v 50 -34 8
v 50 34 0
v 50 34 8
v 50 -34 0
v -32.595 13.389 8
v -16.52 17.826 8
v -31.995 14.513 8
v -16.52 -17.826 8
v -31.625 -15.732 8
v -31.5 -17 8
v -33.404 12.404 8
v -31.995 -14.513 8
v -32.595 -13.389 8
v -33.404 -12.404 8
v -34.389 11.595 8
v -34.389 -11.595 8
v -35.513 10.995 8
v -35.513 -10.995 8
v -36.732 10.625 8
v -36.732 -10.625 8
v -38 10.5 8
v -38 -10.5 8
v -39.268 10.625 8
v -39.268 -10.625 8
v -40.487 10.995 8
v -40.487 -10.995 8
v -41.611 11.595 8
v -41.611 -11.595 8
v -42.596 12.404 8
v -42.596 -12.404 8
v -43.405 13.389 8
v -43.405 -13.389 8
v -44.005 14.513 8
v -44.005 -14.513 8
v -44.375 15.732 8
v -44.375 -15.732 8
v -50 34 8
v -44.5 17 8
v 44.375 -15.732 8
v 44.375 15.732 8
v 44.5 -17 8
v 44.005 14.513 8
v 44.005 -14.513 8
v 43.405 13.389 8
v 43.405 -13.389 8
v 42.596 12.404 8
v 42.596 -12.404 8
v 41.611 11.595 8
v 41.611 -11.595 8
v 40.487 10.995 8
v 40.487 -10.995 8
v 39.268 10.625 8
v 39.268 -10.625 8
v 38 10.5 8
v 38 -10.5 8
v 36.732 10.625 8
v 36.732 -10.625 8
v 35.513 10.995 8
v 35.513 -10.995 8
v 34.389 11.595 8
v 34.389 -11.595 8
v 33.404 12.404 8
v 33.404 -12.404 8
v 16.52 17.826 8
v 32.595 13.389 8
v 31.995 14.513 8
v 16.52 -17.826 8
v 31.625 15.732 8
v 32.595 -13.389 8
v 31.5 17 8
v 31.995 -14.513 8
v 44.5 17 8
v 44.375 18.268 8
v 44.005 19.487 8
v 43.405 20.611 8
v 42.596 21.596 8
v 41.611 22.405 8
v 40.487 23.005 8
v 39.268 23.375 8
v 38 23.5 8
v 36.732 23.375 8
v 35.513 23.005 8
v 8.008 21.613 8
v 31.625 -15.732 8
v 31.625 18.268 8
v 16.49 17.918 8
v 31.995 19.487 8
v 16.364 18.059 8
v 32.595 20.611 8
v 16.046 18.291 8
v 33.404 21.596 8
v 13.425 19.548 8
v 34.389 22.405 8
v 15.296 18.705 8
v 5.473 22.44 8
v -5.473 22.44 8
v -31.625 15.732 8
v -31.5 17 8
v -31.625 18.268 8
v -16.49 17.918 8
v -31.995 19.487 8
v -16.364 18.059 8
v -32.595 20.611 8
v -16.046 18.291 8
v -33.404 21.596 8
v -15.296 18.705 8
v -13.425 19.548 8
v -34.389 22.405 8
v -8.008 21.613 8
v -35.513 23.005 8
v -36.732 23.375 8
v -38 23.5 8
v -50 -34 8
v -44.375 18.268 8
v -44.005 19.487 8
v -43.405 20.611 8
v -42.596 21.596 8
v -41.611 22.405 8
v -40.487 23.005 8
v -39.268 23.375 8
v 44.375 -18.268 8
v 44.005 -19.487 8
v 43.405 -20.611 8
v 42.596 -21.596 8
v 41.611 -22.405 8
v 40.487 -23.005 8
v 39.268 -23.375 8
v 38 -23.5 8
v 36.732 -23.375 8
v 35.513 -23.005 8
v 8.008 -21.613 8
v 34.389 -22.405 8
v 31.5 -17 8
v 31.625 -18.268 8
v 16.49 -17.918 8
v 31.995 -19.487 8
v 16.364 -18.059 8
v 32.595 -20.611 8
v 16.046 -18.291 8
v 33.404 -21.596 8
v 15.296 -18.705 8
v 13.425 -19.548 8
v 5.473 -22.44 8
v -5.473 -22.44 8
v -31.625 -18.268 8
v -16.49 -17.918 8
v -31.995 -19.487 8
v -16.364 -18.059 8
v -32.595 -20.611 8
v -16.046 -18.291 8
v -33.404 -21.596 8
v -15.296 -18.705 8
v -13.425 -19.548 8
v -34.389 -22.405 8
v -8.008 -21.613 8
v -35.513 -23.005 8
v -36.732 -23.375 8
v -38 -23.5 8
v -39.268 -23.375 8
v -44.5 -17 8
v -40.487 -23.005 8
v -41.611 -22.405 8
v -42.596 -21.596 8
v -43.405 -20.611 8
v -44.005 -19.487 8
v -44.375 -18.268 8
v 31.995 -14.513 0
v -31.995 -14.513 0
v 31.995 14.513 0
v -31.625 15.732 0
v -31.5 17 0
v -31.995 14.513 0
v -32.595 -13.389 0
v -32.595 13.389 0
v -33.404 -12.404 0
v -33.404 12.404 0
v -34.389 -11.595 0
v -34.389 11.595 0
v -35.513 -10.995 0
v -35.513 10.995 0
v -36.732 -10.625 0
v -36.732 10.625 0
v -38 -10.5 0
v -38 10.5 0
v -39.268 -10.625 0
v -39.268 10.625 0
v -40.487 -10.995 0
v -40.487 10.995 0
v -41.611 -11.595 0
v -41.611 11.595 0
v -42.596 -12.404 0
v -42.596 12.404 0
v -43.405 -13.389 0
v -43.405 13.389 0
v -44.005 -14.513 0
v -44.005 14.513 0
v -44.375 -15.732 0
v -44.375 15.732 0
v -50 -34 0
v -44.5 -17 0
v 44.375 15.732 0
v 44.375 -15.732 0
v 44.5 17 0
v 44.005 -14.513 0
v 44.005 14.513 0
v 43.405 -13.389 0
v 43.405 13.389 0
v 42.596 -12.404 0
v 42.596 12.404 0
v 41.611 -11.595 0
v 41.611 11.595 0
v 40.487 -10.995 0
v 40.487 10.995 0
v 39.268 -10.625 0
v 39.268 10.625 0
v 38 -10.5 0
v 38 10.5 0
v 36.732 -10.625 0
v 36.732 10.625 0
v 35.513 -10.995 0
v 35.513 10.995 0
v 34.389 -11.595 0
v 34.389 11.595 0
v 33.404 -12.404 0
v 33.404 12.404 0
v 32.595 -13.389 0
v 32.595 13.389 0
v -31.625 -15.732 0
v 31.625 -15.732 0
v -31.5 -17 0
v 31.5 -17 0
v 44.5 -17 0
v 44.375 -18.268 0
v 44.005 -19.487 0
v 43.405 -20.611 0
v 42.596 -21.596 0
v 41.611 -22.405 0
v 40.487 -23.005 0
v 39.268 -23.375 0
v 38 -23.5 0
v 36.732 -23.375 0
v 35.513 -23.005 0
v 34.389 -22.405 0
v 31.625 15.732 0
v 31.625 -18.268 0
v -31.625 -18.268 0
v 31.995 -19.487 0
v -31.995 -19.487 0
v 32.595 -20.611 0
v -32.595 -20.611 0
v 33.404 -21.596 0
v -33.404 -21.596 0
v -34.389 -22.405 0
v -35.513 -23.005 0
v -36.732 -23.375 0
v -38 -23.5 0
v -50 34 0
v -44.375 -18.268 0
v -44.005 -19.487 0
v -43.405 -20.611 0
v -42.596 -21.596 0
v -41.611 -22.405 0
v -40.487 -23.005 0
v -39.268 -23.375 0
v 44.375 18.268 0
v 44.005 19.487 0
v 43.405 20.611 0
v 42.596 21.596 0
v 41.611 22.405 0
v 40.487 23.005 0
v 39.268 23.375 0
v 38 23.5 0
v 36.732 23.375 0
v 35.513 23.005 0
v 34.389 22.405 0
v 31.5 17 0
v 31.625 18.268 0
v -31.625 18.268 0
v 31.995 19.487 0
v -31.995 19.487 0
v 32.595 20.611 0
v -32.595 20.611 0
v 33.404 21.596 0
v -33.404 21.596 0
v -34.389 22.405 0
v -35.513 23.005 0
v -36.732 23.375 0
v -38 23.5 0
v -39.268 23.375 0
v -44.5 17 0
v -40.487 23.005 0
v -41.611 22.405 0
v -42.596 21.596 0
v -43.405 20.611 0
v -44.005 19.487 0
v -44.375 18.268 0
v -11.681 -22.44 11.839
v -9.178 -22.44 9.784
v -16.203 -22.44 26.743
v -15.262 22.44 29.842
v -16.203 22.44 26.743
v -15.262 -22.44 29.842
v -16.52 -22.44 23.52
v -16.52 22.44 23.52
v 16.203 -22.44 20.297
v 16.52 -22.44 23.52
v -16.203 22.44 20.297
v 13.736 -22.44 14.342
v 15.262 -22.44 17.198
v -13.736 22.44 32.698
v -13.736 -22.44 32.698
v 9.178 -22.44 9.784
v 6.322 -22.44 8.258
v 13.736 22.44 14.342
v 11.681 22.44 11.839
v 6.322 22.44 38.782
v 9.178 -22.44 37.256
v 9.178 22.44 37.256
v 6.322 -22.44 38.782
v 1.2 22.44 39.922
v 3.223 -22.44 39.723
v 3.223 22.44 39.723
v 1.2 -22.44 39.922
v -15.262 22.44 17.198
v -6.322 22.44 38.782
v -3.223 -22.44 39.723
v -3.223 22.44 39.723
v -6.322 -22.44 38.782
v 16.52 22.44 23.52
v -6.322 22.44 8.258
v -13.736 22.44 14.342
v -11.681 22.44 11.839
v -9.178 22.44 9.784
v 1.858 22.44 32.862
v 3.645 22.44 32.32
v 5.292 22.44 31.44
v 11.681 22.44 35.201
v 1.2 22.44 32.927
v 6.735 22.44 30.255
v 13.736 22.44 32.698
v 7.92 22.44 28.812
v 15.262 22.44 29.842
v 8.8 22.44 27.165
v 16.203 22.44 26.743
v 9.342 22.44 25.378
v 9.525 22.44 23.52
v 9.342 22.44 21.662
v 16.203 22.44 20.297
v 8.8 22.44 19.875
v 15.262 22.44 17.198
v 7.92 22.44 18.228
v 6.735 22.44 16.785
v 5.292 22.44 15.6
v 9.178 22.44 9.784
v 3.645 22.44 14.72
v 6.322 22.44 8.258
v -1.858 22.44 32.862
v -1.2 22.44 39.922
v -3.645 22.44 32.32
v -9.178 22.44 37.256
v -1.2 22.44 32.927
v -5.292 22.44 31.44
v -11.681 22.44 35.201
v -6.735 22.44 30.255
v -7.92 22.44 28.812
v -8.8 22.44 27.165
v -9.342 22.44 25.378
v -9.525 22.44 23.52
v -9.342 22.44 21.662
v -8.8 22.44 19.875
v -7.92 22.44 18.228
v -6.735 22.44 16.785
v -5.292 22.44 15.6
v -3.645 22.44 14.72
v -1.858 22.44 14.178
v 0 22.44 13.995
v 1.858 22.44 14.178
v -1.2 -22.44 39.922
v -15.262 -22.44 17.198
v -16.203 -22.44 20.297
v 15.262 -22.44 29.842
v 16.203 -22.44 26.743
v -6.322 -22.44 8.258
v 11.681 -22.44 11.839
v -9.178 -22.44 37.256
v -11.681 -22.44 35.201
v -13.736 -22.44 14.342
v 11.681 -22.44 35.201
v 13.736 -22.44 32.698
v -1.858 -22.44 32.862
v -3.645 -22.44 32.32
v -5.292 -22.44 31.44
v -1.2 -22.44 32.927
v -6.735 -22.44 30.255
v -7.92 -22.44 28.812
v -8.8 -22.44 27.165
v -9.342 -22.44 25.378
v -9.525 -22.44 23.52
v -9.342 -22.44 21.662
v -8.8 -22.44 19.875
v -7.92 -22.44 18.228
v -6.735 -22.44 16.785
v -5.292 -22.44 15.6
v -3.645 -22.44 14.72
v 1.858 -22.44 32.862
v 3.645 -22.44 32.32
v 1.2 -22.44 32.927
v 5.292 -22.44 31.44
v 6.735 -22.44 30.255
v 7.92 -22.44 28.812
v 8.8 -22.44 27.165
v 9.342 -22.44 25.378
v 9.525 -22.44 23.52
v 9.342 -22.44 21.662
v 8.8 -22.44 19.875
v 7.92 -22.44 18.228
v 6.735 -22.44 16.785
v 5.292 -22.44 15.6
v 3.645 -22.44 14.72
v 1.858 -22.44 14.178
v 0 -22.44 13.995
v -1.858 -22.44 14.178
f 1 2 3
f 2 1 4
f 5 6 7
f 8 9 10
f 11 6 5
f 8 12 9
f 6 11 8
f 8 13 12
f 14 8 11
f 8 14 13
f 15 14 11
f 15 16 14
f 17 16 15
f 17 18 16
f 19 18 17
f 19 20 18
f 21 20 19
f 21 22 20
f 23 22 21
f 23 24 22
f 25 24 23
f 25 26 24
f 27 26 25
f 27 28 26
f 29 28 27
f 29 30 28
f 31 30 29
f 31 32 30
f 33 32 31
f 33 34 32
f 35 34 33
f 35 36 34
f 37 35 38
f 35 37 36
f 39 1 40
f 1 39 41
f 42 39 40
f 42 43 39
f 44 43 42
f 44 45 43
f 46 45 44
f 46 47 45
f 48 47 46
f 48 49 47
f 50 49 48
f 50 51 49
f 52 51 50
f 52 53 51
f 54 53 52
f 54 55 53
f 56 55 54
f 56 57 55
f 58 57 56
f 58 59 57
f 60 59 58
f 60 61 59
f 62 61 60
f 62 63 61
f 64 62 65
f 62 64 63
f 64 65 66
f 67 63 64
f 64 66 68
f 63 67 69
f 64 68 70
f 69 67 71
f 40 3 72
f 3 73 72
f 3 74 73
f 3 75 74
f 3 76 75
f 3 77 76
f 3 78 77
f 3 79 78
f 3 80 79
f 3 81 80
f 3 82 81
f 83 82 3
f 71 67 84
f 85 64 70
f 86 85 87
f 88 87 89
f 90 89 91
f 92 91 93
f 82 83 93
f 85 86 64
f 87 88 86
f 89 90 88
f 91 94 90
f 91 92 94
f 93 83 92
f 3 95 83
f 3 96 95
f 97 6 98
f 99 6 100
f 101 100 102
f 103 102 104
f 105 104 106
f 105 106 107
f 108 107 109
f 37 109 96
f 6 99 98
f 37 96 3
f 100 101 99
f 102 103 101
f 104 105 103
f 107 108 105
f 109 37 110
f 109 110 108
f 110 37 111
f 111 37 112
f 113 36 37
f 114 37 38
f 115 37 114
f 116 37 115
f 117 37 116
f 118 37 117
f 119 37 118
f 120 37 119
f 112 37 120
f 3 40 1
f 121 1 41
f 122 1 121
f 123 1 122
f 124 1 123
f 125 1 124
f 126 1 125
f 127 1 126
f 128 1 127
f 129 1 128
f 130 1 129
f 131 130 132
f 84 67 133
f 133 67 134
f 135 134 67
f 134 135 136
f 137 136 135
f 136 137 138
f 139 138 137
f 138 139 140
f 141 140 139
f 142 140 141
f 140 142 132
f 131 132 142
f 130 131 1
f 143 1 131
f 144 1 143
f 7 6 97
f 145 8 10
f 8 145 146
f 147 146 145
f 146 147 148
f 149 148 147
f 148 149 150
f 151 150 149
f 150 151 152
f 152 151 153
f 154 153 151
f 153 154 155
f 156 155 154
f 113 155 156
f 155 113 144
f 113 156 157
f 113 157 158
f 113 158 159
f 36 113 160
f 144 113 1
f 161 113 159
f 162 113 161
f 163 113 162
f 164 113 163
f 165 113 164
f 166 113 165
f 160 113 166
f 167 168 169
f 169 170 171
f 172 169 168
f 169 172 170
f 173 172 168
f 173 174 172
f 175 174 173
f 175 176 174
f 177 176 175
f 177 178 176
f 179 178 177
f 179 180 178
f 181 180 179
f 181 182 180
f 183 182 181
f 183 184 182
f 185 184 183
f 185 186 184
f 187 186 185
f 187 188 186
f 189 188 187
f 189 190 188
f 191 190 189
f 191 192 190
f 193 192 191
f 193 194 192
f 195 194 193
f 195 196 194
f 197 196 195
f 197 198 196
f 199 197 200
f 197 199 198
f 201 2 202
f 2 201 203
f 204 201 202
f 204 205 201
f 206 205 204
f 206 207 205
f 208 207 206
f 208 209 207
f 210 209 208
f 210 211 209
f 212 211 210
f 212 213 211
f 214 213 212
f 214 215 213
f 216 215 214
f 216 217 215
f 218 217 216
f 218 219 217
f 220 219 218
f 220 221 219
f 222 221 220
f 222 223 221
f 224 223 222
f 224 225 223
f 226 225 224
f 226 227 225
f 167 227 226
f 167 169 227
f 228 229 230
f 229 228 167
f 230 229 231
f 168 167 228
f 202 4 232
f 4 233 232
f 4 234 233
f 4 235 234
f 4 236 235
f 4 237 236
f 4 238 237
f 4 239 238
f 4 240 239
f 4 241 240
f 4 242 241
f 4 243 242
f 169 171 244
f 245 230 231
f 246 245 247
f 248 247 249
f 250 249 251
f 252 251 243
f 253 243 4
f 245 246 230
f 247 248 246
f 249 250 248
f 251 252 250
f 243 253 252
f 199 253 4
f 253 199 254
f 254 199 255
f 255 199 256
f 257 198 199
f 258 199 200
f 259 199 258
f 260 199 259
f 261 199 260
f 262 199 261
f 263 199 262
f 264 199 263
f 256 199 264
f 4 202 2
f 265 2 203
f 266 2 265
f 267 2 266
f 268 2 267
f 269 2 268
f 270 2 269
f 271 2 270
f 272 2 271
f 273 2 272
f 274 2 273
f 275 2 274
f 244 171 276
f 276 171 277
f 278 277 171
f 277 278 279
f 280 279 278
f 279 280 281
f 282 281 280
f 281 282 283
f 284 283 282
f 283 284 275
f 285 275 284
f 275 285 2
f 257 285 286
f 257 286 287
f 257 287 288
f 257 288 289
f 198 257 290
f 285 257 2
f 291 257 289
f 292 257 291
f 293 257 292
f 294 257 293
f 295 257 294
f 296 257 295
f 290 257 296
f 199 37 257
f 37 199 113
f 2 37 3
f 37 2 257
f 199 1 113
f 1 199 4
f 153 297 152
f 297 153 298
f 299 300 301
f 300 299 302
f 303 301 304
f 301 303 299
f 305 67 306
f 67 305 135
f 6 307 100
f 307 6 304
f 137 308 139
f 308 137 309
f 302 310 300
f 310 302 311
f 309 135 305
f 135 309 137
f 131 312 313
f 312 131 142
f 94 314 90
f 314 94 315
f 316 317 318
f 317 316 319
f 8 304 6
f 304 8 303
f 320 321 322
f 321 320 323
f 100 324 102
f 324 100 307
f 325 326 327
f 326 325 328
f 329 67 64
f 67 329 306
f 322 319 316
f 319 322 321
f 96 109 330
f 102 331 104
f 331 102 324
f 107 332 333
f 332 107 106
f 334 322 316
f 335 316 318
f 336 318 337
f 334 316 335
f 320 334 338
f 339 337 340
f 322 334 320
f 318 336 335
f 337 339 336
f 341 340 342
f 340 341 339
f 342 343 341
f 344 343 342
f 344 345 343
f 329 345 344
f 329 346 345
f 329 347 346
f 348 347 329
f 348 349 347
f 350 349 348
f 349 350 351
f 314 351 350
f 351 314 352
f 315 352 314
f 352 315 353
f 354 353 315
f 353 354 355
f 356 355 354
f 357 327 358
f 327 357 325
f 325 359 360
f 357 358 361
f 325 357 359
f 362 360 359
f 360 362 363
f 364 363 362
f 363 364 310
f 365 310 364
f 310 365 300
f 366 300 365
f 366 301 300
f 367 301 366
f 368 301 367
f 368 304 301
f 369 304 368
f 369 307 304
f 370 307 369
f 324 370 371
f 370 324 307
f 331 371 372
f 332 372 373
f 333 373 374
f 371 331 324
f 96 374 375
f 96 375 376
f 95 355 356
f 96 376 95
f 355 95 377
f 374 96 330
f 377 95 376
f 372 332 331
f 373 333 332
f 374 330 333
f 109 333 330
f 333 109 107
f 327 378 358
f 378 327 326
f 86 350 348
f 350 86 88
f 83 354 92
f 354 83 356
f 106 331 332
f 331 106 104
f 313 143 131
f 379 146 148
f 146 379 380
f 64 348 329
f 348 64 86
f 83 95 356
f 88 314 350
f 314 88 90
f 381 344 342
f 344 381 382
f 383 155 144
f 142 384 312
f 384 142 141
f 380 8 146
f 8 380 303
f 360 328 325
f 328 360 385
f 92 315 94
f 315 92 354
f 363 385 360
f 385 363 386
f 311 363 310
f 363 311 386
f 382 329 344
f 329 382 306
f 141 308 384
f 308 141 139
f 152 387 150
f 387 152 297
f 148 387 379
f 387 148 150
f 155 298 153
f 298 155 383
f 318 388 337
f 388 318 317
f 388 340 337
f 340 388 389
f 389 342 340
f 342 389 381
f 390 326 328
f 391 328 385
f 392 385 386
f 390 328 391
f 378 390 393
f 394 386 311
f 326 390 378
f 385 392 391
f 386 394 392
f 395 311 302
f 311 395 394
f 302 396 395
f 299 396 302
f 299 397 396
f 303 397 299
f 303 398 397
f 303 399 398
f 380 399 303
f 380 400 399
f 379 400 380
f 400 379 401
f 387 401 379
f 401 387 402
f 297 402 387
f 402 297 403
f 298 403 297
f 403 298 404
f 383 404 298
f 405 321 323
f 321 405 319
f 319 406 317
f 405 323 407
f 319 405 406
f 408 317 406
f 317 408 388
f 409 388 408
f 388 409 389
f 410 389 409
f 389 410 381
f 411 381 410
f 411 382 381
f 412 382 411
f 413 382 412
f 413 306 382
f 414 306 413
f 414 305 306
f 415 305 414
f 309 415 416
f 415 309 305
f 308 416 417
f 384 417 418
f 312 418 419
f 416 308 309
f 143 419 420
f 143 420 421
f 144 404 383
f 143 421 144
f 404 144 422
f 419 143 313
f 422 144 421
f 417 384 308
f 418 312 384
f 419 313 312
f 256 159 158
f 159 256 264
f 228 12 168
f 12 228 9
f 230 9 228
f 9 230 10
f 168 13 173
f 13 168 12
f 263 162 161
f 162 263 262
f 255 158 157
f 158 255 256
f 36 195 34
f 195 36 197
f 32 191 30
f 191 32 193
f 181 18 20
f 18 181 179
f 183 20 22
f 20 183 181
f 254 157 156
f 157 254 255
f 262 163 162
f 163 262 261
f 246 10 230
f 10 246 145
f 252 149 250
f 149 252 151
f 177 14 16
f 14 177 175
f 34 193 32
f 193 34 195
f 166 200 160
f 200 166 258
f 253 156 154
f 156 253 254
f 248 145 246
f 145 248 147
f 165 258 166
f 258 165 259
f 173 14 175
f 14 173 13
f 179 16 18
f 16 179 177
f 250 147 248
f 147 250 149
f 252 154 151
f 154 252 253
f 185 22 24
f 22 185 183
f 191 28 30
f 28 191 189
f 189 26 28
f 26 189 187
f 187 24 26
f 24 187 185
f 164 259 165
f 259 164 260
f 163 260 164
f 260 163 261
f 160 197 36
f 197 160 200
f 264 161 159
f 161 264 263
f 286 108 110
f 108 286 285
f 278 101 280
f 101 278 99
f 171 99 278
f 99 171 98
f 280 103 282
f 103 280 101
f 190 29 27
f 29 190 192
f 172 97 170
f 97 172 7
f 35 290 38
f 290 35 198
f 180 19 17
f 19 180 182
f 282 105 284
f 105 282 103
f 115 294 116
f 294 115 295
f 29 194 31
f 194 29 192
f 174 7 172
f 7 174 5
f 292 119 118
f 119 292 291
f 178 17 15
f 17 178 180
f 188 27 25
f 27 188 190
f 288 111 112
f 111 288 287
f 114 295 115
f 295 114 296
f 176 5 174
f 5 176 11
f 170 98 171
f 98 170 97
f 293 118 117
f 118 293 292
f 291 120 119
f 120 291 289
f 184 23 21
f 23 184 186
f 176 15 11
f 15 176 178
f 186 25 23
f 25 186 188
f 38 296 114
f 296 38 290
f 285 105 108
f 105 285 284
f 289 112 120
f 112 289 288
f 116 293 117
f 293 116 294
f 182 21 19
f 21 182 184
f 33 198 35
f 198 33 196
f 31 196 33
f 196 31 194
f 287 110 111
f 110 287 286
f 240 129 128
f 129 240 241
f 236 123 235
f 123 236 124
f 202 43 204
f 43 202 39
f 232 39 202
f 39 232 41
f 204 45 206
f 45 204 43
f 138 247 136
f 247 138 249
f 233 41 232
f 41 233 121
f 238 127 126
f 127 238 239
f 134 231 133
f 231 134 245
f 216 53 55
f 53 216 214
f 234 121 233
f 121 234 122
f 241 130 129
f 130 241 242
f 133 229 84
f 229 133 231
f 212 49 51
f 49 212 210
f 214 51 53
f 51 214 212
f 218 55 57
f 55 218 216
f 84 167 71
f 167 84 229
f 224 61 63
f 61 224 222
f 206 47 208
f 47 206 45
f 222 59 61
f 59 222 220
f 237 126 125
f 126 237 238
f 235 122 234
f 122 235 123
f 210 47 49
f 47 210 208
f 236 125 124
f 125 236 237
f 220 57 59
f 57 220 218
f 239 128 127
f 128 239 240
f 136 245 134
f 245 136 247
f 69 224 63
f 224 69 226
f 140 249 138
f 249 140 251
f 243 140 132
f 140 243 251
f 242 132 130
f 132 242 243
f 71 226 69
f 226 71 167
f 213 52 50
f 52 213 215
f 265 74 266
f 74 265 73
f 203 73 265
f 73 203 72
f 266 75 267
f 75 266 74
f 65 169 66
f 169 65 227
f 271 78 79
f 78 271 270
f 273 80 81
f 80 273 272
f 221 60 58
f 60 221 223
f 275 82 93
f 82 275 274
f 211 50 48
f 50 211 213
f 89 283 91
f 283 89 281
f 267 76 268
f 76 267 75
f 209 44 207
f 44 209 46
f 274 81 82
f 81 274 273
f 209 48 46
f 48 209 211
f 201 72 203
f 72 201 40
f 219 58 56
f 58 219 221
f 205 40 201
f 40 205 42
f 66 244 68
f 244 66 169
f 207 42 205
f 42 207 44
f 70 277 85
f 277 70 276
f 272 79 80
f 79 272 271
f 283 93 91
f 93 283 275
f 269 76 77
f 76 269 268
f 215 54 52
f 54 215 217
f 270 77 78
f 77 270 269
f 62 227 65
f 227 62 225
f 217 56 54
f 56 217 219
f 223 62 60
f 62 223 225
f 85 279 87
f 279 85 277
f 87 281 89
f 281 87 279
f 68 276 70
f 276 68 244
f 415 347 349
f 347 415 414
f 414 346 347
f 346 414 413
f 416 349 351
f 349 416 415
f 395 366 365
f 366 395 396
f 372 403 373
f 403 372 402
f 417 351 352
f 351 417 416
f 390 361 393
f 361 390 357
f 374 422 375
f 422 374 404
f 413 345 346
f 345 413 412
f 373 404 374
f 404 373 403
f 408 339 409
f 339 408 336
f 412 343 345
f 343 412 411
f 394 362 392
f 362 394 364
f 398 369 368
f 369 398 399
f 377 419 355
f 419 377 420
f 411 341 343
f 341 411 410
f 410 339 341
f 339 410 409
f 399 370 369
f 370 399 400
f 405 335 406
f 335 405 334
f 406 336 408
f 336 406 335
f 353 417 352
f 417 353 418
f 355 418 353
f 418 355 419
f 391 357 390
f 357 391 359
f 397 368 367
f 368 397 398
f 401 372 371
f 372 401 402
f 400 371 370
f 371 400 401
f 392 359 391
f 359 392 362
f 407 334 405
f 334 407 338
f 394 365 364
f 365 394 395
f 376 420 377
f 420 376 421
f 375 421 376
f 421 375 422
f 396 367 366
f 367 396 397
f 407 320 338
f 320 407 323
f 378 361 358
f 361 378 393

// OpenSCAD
$fn = 32;

// ----------------------------------------------------------------------
// Bearing block: 100 x 68 mm base, 19.05 mm bore at 23.52 mm
// ----------------------------------------------------------------------

// --- parameters (mm) ---
base_w = 100;             // base width
base_d = 68;              // base depth
base_t = 8;               // base thickness
bore_d = 19.05;           // shaft / bearing bore
house_r = 16.52;          // housing outer radius
house_len = 44.88;        // housing length along the shaft
foot_w = 33.04;           // foot width under the housing
foot_len = 34.88;         // foot length along the shaft
axis_z = 23.52;           // bore axis height above the base
holes_d = 13;             // mounting holes
hole_x = 38;              // mounting hole spacing
groove_w = 2.4;           // oil groove width

difference() {
  union() {
    /* base plate with its underside on z = 0 */
    translate([0, 0, base_t / 2]) cube([base_w, base_d, base_t], center = true);
    /* hull foot: a straight web blending into the round housing */
    hull() {
      translate([0, 0, base_t - 0.5]) cube([foot_w, foot_len, 1.6], center = true);
      translate([0, 0, axis_z]) rotate([-90, 0, 0]) cylinder(h = house_len, d = 2 * house_r, center = true);
    }
  }
  /* bore through the housing, 2.5 mm clear on both sides */
  translate([0, 0, axis_z]) rotate([-90, 0, 0]) cylinder(h = house_len + 5, d = bore_d, center = true);
  /* oil groove from the top of the housing into the bore */
  translate([-groove_w / 2, -house_len / 2 - 2.5, axis_z + bore_d * 0.17]) cube([groove_w, house_len + 5, house_r + 5]);
  /* mounting holes through the base plate */
  for (hx = [-38, 38]) {
    for (hy = [-17, 17]) {
      translate([hx, hy, -2.5]) cylinder(h = base_t + 5, d = holes_d);
    }
  }
}
